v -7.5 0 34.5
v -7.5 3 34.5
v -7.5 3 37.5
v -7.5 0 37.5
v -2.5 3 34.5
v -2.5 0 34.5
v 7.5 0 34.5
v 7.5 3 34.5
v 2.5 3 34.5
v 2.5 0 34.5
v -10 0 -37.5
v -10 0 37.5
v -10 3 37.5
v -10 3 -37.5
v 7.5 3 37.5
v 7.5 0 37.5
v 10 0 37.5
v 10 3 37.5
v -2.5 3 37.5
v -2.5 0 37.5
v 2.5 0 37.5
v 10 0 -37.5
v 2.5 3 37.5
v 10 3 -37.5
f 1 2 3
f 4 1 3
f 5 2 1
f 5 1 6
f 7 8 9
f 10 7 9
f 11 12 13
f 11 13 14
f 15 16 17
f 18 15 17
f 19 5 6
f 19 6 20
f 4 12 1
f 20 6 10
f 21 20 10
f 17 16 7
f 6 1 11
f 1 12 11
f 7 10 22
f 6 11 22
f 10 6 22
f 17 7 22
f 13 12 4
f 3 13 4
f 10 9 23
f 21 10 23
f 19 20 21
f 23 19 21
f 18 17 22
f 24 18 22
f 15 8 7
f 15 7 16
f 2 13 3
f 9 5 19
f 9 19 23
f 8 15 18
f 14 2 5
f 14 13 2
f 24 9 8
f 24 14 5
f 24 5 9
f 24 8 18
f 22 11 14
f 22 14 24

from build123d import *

# Parameters (mm, degrees)
SKETCH1_W           = 20
SKETCH1_H           = 75
BOSS_EXTRUDE1_DEPTH = 3
CUT_EXTRUDE1_START  = -4
SKETCH2_W           = 5
SKETCH2_H           = 3
CUT_EXTRUDE1_DEPTH  = 5


with BuildPart() as part:
    # Sketch1 → Boss-Extrude1 (new body)
    with BuildSketch(Plane(origin=(0, 0, 0), x_dir=(1, 0, 0), z_dir=(0, 1, 0))):
        Rectangle(SKETCH1_W, SKETCH1_H)
    extrude(amount=BOSS_EXTRUDE1_DEPTH)

    # Sketch2 → Cut-Extrude1 (cut)
    with BuildSketch(Plane.XZ.offset(CUT_EXTRUDE1_START)):
        with Locations((-5, 36)):
            Rectangle(SKETCH2_W, SKETCH2_H)
    cut_extrude1 = extrude(amount=CUT_EXTRUDE1_DEPTH, mode=Mode.SUBTRACT)

    # Mirror1: Cut-Extrude1 across plane
    add(cut_extrude1.mirror(Plane(origin=(0, 0, 0), x_dir=(0, 0, 1), z_dir=(1, 0, 0))), mode=Mode.SUBTRACT)


solid = part.part
